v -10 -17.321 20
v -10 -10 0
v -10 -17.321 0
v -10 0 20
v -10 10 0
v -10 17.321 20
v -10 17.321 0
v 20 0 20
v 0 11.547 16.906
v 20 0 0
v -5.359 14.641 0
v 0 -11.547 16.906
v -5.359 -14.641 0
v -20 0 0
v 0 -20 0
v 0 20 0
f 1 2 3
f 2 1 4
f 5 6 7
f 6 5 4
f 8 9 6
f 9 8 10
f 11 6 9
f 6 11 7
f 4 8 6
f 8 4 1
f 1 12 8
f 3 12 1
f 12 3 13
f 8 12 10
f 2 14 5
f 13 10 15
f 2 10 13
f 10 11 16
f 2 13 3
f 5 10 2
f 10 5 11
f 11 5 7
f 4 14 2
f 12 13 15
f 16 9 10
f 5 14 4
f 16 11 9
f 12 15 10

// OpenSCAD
 cylinder(20,20,20,$fn=3);
 cylinder(20,20,00,$fn=4);
 cylinder(20,20,10,$fn=4);
